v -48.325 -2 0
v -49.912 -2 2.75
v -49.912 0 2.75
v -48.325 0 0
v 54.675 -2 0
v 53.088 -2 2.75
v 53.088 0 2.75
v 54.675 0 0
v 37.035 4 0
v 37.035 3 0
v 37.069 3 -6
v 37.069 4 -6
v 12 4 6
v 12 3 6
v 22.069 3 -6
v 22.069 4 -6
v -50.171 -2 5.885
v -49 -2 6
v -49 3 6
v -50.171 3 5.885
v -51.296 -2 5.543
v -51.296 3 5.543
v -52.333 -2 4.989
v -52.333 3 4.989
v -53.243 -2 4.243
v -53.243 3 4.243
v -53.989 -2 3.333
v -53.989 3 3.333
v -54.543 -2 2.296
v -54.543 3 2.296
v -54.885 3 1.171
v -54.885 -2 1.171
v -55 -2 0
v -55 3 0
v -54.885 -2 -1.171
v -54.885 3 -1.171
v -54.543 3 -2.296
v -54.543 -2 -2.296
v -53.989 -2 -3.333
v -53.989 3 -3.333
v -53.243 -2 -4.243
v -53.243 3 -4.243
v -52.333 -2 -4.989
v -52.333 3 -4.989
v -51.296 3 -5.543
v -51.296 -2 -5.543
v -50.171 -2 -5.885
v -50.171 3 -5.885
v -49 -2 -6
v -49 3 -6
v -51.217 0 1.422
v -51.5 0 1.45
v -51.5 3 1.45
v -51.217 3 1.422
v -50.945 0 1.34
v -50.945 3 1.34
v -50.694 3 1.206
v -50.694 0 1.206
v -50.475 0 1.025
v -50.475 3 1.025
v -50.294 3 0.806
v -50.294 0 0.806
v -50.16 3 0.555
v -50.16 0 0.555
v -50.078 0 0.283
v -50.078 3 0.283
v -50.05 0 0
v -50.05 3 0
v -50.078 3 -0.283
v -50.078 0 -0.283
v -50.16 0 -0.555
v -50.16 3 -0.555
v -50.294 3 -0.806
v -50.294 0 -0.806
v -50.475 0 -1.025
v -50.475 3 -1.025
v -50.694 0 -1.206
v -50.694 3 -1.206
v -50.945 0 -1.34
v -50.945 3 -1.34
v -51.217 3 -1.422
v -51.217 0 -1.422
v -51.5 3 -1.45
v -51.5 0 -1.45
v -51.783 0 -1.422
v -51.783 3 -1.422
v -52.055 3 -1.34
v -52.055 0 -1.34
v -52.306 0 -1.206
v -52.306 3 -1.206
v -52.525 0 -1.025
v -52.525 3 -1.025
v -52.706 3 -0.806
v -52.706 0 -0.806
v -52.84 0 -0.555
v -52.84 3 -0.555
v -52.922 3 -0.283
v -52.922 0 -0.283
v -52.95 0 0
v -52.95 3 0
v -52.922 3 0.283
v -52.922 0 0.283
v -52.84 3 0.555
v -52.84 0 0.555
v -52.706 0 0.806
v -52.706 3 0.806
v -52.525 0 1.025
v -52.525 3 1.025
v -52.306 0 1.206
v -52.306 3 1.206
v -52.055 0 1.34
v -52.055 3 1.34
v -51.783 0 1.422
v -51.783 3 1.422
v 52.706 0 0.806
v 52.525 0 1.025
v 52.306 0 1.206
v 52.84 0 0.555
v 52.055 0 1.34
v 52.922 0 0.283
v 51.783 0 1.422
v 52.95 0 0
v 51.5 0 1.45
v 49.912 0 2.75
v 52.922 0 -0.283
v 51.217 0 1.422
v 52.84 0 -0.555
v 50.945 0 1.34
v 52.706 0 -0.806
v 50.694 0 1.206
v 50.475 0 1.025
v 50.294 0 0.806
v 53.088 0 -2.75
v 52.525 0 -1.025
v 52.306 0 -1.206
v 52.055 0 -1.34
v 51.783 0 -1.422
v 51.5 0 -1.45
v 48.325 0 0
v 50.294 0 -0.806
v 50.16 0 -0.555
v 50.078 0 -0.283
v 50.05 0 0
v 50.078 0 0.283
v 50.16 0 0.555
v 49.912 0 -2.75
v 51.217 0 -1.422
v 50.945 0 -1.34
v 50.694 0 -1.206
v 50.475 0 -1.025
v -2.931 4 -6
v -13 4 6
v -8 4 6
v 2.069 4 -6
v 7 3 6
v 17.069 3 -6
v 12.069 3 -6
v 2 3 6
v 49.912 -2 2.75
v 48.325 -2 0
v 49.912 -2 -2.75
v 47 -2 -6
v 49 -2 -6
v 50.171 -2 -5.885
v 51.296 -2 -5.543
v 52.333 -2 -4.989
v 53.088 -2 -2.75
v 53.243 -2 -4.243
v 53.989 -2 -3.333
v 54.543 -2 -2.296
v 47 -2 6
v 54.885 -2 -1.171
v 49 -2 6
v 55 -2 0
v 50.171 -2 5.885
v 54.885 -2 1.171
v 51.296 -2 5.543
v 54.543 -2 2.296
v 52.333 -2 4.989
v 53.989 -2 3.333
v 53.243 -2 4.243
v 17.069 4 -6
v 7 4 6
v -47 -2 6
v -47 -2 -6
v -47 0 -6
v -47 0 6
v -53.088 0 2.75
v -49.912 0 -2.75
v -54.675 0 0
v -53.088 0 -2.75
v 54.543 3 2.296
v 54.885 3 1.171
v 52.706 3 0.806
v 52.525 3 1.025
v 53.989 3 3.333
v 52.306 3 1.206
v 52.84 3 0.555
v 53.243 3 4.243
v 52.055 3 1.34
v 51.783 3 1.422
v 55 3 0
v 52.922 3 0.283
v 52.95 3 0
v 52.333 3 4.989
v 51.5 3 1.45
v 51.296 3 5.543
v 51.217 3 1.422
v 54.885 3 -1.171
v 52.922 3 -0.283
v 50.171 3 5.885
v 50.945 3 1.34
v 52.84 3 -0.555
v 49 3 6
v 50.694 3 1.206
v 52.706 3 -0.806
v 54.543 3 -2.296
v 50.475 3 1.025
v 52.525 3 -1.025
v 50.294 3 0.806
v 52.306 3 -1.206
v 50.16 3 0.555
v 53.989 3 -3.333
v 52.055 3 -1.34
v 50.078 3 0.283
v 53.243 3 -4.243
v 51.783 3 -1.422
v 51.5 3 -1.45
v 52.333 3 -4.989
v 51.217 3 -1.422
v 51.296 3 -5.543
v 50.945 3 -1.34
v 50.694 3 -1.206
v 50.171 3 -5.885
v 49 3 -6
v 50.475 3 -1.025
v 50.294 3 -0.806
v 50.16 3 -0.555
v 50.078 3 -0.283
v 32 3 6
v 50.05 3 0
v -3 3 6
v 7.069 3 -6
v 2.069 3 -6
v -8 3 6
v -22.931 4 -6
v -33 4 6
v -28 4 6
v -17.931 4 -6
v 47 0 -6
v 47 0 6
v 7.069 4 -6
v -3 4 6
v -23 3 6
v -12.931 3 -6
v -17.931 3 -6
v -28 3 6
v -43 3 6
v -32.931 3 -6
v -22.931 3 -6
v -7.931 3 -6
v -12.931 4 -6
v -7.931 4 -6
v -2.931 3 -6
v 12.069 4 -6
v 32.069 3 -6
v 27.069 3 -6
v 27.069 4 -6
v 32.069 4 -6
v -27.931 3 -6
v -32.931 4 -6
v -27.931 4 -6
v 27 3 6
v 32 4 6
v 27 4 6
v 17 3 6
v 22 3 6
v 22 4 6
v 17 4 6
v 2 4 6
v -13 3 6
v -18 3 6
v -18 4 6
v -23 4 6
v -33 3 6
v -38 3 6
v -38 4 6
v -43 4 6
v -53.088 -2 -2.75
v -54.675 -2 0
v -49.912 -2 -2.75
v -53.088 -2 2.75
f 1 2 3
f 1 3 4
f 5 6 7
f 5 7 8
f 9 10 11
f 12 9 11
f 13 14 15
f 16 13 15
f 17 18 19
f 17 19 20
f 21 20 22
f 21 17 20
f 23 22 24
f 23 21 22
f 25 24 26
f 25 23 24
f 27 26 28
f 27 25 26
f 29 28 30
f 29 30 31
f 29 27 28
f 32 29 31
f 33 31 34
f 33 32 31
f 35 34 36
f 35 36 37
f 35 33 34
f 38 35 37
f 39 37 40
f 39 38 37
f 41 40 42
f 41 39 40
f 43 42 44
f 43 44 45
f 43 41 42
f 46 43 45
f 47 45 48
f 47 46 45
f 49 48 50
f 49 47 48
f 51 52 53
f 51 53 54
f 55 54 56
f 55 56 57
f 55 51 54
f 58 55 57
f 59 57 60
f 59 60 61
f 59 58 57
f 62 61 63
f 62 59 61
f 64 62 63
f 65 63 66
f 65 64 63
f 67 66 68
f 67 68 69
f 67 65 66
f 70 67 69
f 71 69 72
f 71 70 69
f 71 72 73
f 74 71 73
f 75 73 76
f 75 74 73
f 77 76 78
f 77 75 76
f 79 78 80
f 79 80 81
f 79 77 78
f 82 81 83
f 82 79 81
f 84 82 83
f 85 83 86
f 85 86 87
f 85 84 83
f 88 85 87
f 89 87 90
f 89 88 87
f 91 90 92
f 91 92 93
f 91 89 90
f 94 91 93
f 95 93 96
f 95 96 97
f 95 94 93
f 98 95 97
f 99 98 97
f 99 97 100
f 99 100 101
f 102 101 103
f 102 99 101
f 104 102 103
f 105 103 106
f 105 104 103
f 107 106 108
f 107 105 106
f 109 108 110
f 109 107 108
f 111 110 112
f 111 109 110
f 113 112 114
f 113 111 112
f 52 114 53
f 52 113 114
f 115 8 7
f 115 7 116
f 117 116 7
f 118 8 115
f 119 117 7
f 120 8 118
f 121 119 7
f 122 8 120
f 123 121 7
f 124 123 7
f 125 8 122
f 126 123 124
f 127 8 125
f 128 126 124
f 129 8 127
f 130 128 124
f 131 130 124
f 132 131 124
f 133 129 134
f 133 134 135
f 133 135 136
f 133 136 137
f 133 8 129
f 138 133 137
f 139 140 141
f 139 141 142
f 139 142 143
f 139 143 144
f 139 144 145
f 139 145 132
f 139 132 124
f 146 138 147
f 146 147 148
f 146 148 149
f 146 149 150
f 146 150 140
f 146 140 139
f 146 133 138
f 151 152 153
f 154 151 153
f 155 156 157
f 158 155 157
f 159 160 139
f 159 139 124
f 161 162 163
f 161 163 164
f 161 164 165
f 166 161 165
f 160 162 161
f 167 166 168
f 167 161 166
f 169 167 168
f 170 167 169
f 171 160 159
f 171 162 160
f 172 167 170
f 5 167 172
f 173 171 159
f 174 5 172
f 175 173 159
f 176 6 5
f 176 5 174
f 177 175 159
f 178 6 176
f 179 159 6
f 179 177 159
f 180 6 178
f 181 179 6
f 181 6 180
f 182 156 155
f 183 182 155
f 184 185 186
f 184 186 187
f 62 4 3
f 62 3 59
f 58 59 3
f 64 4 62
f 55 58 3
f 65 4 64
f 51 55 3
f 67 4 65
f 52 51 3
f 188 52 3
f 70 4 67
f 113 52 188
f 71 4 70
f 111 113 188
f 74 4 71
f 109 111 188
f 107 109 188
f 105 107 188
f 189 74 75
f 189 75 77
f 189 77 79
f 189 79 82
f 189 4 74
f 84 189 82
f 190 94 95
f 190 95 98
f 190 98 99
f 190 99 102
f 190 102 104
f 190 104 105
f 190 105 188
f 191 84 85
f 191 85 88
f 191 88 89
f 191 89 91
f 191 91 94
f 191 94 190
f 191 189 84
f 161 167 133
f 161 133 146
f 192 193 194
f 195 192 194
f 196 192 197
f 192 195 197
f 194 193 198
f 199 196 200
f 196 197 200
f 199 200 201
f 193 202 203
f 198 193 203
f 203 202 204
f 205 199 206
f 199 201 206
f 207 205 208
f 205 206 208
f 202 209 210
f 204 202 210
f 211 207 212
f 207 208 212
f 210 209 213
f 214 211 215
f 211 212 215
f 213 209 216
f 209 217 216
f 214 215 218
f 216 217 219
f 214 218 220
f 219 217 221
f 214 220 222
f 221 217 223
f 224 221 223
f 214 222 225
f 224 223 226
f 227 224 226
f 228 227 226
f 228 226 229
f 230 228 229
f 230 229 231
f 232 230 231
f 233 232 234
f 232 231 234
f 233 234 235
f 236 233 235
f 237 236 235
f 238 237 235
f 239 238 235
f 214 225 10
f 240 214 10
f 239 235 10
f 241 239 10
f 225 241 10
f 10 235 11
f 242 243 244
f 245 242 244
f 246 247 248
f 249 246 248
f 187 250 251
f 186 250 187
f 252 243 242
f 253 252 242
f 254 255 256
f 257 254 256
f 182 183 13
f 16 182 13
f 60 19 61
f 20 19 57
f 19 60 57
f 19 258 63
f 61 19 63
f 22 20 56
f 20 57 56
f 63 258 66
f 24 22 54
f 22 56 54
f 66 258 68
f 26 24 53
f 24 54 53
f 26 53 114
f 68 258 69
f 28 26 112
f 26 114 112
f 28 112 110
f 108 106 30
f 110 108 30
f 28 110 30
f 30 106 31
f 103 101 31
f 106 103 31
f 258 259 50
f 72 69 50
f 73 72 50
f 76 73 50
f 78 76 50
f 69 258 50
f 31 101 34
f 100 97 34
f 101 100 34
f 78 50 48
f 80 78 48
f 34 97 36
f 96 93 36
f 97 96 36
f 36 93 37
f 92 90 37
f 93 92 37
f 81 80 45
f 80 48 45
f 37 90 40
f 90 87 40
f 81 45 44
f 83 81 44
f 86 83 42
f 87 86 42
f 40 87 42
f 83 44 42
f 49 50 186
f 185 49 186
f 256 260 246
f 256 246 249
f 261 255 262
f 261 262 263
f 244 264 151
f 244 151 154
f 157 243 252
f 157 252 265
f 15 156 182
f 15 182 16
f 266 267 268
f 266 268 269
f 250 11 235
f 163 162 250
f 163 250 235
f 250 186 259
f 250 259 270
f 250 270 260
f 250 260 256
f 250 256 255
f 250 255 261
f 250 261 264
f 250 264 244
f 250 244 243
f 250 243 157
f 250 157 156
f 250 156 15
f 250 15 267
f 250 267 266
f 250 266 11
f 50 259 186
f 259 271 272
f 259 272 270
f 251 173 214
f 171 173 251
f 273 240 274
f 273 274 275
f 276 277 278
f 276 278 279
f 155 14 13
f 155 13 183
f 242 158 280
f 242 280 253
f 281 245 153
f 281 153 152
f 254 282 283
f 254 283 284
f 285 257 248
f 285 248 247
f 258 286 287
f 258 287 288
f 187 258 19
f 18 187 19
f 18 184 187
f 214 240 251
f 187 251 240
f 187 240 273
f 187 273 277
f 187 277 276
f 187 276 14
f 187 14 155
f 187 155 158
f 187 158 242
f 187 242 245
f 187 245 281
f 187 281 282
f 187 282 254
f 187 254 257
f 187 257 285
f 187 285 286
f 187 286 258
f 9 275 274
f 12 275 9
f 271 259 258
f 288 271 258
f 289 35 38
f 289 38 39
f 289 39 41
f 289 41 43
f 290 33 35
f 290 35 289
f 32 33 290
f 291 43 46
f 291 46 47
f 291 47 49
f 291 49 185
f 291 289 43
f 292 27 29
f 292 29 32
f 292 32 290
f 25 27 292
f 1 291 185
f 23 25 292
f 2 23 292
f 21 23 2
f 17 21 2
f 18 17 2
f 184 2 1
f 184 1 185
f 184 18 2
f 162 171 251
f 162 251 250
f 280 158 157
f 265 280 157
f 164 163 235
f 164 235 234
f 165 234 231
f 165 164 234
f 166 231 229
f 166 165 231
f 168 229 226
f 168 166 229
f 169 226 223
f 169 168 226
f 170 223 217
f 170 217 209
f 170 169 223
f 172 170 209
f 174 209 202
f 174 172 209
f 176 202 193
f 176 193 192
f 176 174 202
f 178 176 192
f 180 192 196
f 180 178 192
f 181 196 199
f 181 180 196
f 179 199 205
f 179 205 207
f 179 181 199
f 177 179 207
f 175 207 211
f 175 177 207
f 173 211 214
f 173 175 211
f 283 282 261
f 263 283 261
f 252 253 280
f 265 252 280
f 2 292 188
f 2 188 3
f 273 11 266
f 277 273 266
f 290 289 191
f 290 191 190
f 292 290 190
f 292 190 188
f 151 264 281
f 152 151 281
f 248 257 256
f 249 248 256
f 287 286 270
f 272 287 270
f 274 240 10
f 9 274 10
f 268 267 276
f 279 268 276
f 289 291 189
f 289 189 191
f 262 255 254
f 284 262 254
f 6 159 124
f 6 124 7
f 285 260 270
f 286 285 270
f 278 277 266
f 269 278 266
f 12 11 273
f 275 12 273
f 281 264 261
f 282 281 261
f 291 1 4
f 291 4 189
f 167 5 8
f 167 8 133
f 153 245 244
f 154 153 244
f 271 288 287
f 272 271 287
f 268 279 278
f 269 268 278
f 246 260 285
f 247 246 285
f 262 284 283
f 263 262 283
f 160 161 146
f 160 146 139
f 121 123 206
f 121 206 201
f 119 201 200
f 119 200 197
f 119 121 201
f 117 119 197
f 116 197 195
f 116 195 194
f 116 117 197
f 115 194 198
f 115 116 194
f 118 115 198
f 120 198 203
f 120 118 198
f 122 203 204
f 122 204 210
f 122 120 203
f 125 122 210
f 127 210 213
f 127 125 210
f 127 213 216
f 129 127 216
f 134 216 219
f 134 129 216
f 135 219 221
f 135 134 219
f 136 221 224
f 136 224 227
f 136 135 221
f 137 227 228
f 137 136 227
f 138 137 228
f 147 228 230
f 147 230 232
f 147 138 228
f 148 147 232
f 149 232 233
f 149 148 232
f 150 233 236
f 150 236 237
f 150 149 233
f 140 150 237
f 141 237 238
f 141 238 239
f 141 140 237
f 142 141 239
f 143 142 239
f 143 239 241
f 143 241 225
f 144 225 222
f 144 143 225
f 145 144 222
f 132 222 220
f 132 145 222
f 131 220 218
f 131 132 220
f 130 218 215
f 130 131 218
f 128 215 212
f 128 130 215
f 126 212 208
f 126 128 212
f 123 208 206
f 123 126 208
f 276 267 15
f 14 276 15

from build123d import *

# Parameters (mm, degrees)
SKETCH1_R           = 1.45
BOSS_EXTRUDE1_DEPTH = 3
BOSS_EXTRUDE2_START = 2
BOSS_EXTRUDE2_DEPTH = 2
BOSS_EXTRUDE3_DEPTH = 1


with BuildPart() as part:
    # Sketch1 → Boss-Extrude1 (new body)
    with BuildSketch(Plane(origin=(0, 0, 0), x_dir=(1, 0, 0), z_dir=(0, 1, 0))):
        with BuildLine():
            Line((-49, 6), (49, 6))
            ThreePointArc((49, 6), (55, 0), (49, -6))
            Line((49, -6), (-49, -6))
            ThreePointArc((-49, -6), (-55, 0), (-49, 6))
        make_face()
        with Locations(Location((-51.5, 0, 0), (0, 0, 270))):
            Circle(SKETCH1_R, mode=Mode.SUBTRACT)
        with Locations(Location((51.5, 0, 0), (0, 0, 270))):
            Circle(SKETCH1_R, mode=Mode.SUBTRACT)
    extrude(amount=BOSS_EXTRUDE1_DEPTH)

    # Sketch2 → Boss-Extrude2 (add)
    # profile 1 of 2: a face of its own
    with BuildSketch(Plane.XZ.offset(BOSS_EXTRUDE2_START)):
        with BuildLine():
            Line((49, 6), (47, 6))
            Line((47, 6), (47, -6))
            Line((47, -6), (49, -6))
            ThreePointArc((49, -6), (55, 0), (49, 6))
        make_face()
        Polygon((54.675426481, 0), (53.08771324, -2.75), (49.91228676, -2.75), (48.324573519, 0), (49.91228676, 2.75), (53.08771324, 2.75), align=None, mode=Mode.SUBTRACT)
    # profile 2 of 2: a face of its own
    with BuildSketch(Plane.XZ.offset(BOSS_EXTRUDE2_START)):
        with BuildLine():
            Line((-47, -6), (-47, 6))
            Line((-47, 6), (-49, 6))
            ThreePointArc((-49, 6), (-55, 0), (-49, -6))
            Line((-49, -6), (-47, -6))
        make_face()
        Polygon((-48.324573519, 0), (-49.91228676, -2.75), (-53.08771324, -2.75), (-54.675426481, 0), (-53.08771324, 2.75), (-49.91228676, 2.75), align=None, mode=Mode.SUBTRACT)
    extrude(amount=-BOSS_EXTRUDE2_DEPTH)

    # Sketch3 → Boss-Extrude3 (add)
    with BuildSketch(Plane(origin=(0, 3, 0), x_dir=(1, 0, 0), z_dir=(0, 1, 0))):
        Polygon((-32.930804426, 6), (-43, -6), (-38, -6), (-27.930804426, 6), align=None)
        Polygon((-17.930804426, 6), (-22.930804426, 6), (-33, -6), (-28, -6), align=None)
        Polygon((-7.930804426, 6), (-12.930804426, 6), (-23, -6), (-18, -6), align=None)
        Polygon((2.069195574, 6), (-2.930804426, 6), (-13, -6), (-8, -6), align=None)
        Polygon((12.069195574, 6), (7.069195574, 6), (-3, -6), (2, -6), align=None)
        Polygon((22.069195574, 6), (17.069195574, 6), (7, -6), (12, -6), align=None)
        Polygon((32.069195574, 6), (27.069195574, 6), (17, -6), (22, -6), align=None)
        Polygon((37.069195574, 6), (27, -6), (32, -6), (37.034597787, 0), align=None)
    extrude(amount=BOSS_EXTRUDE3_DEPTH)


solid = part.part
